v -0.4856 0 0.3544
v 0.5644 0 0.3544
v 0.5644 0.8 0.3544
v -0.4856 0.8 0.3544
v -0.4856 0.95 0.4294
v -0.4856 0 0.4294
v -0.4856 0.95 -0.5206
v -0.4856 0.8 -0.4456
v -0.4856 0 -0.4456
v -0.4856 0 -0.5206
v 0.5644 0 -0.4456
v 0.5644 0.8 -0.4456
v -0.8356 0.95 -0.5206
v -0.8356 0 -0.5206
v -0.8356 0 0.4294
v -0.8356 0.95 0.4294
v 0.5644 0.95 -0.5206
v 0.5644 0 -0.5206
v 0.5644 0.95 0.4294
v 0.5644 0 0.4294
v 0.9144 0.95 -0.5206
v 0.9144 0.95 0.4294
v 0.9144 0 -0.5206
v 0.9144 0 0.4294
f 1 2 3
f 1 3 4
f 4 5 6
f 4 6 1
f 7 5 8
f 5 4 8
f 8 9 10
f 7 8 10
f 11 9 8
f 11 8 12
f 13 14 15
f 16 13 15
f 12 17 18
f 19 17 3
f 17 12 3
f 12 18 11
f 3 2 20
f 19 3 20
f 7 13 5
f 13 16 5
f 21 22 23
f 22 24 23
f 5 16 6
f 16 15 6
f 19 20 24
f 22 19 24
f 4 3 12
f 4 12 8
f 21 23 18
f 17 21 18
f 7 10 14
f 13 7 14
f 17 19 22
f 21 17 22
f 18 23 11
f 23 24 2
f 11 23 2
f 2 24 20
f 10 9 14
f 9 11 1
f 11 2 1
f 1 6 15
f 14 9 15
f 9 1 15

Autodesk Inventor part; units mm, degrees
ref_plane "YZ Plane" through (0, 0, 0) normal (1, 0, 0) x (0, 1, 0)
ref_plane "XZ Plane" through (0, 0, 0) normal (0, 1, 0) x (-1, 0, 0)
ref_plane "XY Plane" through (0, 0, 0) normal (0, 0, 1) x (1, 0, 0)
sketch "Sketch1" plane through (0, 0, 0) normal (0, 1, 0) x (-1, 0, 0)
  line L0 (-0.8394, 0.3544) -> (0.7606, 0.3544)
  line L1 (0.7606, 0.3544) -> (0.7606, -0.4456)
  line L2 (0.7606, -0.4456) -> (-0.8394, -0.4456)
  line L3 (-0.8394, -0.4456) -> (-0.8394, 0.3544)
  point P0 (0, 0)
  dimension "d0" = 1.6
  dimension "d1" = 0.8
extrude "Extrusion1" add sketch "Sketch1" along normal blind 0.8
sketch "Sketch2" plane through (0, 0, 0) normal (0, -1, 0) x (1, 0, 0)
  line L0 (-0.7606, -0.4456) -> (0.8394, -0.4456) projected
  line L1 (0.8394, -0.4456) -> (0.8394, 0.3544) projected
  line L2 (-0.8356, 0.4294) -> (-0.4856, 0.4294)
  line L3 (-0.4856, 0.4294) -> (-0.4856, -0.5206)
  line L4 (-0.4856, -0.5206) -> (-0.8356, -0.5206)
  line L5 (-0.8356, -0.5206) -> (-0.8356, 0.4294)
  line L6 (0.5644, 0.4294) -> (0.9144, 0.4294)
  line L7 (0.9144, 0.4294) -> (0.9144, -0.5206)
  line L8 (0.9144, -0.5206) -> (0.5644, -0.5206)
  line L9 (0.5644, -0.5206) -> (0.5644, 0.4294)
  point P0 (0, 0)
  dimension "d4" = 0.35
  dimension "d5" = 0.35
  dimension "d6" = 1.75
  dimension "d7" = 0.075
  dimension "d8" = 0.95
  dimension "d9" = 0.95
  dimension "d10" = 0.075
  dimension "d11" = 0.075
extrude "Extrusion2" add sketch "Sketch2" against normal blind 0.95
properties part number "0603Cap"
